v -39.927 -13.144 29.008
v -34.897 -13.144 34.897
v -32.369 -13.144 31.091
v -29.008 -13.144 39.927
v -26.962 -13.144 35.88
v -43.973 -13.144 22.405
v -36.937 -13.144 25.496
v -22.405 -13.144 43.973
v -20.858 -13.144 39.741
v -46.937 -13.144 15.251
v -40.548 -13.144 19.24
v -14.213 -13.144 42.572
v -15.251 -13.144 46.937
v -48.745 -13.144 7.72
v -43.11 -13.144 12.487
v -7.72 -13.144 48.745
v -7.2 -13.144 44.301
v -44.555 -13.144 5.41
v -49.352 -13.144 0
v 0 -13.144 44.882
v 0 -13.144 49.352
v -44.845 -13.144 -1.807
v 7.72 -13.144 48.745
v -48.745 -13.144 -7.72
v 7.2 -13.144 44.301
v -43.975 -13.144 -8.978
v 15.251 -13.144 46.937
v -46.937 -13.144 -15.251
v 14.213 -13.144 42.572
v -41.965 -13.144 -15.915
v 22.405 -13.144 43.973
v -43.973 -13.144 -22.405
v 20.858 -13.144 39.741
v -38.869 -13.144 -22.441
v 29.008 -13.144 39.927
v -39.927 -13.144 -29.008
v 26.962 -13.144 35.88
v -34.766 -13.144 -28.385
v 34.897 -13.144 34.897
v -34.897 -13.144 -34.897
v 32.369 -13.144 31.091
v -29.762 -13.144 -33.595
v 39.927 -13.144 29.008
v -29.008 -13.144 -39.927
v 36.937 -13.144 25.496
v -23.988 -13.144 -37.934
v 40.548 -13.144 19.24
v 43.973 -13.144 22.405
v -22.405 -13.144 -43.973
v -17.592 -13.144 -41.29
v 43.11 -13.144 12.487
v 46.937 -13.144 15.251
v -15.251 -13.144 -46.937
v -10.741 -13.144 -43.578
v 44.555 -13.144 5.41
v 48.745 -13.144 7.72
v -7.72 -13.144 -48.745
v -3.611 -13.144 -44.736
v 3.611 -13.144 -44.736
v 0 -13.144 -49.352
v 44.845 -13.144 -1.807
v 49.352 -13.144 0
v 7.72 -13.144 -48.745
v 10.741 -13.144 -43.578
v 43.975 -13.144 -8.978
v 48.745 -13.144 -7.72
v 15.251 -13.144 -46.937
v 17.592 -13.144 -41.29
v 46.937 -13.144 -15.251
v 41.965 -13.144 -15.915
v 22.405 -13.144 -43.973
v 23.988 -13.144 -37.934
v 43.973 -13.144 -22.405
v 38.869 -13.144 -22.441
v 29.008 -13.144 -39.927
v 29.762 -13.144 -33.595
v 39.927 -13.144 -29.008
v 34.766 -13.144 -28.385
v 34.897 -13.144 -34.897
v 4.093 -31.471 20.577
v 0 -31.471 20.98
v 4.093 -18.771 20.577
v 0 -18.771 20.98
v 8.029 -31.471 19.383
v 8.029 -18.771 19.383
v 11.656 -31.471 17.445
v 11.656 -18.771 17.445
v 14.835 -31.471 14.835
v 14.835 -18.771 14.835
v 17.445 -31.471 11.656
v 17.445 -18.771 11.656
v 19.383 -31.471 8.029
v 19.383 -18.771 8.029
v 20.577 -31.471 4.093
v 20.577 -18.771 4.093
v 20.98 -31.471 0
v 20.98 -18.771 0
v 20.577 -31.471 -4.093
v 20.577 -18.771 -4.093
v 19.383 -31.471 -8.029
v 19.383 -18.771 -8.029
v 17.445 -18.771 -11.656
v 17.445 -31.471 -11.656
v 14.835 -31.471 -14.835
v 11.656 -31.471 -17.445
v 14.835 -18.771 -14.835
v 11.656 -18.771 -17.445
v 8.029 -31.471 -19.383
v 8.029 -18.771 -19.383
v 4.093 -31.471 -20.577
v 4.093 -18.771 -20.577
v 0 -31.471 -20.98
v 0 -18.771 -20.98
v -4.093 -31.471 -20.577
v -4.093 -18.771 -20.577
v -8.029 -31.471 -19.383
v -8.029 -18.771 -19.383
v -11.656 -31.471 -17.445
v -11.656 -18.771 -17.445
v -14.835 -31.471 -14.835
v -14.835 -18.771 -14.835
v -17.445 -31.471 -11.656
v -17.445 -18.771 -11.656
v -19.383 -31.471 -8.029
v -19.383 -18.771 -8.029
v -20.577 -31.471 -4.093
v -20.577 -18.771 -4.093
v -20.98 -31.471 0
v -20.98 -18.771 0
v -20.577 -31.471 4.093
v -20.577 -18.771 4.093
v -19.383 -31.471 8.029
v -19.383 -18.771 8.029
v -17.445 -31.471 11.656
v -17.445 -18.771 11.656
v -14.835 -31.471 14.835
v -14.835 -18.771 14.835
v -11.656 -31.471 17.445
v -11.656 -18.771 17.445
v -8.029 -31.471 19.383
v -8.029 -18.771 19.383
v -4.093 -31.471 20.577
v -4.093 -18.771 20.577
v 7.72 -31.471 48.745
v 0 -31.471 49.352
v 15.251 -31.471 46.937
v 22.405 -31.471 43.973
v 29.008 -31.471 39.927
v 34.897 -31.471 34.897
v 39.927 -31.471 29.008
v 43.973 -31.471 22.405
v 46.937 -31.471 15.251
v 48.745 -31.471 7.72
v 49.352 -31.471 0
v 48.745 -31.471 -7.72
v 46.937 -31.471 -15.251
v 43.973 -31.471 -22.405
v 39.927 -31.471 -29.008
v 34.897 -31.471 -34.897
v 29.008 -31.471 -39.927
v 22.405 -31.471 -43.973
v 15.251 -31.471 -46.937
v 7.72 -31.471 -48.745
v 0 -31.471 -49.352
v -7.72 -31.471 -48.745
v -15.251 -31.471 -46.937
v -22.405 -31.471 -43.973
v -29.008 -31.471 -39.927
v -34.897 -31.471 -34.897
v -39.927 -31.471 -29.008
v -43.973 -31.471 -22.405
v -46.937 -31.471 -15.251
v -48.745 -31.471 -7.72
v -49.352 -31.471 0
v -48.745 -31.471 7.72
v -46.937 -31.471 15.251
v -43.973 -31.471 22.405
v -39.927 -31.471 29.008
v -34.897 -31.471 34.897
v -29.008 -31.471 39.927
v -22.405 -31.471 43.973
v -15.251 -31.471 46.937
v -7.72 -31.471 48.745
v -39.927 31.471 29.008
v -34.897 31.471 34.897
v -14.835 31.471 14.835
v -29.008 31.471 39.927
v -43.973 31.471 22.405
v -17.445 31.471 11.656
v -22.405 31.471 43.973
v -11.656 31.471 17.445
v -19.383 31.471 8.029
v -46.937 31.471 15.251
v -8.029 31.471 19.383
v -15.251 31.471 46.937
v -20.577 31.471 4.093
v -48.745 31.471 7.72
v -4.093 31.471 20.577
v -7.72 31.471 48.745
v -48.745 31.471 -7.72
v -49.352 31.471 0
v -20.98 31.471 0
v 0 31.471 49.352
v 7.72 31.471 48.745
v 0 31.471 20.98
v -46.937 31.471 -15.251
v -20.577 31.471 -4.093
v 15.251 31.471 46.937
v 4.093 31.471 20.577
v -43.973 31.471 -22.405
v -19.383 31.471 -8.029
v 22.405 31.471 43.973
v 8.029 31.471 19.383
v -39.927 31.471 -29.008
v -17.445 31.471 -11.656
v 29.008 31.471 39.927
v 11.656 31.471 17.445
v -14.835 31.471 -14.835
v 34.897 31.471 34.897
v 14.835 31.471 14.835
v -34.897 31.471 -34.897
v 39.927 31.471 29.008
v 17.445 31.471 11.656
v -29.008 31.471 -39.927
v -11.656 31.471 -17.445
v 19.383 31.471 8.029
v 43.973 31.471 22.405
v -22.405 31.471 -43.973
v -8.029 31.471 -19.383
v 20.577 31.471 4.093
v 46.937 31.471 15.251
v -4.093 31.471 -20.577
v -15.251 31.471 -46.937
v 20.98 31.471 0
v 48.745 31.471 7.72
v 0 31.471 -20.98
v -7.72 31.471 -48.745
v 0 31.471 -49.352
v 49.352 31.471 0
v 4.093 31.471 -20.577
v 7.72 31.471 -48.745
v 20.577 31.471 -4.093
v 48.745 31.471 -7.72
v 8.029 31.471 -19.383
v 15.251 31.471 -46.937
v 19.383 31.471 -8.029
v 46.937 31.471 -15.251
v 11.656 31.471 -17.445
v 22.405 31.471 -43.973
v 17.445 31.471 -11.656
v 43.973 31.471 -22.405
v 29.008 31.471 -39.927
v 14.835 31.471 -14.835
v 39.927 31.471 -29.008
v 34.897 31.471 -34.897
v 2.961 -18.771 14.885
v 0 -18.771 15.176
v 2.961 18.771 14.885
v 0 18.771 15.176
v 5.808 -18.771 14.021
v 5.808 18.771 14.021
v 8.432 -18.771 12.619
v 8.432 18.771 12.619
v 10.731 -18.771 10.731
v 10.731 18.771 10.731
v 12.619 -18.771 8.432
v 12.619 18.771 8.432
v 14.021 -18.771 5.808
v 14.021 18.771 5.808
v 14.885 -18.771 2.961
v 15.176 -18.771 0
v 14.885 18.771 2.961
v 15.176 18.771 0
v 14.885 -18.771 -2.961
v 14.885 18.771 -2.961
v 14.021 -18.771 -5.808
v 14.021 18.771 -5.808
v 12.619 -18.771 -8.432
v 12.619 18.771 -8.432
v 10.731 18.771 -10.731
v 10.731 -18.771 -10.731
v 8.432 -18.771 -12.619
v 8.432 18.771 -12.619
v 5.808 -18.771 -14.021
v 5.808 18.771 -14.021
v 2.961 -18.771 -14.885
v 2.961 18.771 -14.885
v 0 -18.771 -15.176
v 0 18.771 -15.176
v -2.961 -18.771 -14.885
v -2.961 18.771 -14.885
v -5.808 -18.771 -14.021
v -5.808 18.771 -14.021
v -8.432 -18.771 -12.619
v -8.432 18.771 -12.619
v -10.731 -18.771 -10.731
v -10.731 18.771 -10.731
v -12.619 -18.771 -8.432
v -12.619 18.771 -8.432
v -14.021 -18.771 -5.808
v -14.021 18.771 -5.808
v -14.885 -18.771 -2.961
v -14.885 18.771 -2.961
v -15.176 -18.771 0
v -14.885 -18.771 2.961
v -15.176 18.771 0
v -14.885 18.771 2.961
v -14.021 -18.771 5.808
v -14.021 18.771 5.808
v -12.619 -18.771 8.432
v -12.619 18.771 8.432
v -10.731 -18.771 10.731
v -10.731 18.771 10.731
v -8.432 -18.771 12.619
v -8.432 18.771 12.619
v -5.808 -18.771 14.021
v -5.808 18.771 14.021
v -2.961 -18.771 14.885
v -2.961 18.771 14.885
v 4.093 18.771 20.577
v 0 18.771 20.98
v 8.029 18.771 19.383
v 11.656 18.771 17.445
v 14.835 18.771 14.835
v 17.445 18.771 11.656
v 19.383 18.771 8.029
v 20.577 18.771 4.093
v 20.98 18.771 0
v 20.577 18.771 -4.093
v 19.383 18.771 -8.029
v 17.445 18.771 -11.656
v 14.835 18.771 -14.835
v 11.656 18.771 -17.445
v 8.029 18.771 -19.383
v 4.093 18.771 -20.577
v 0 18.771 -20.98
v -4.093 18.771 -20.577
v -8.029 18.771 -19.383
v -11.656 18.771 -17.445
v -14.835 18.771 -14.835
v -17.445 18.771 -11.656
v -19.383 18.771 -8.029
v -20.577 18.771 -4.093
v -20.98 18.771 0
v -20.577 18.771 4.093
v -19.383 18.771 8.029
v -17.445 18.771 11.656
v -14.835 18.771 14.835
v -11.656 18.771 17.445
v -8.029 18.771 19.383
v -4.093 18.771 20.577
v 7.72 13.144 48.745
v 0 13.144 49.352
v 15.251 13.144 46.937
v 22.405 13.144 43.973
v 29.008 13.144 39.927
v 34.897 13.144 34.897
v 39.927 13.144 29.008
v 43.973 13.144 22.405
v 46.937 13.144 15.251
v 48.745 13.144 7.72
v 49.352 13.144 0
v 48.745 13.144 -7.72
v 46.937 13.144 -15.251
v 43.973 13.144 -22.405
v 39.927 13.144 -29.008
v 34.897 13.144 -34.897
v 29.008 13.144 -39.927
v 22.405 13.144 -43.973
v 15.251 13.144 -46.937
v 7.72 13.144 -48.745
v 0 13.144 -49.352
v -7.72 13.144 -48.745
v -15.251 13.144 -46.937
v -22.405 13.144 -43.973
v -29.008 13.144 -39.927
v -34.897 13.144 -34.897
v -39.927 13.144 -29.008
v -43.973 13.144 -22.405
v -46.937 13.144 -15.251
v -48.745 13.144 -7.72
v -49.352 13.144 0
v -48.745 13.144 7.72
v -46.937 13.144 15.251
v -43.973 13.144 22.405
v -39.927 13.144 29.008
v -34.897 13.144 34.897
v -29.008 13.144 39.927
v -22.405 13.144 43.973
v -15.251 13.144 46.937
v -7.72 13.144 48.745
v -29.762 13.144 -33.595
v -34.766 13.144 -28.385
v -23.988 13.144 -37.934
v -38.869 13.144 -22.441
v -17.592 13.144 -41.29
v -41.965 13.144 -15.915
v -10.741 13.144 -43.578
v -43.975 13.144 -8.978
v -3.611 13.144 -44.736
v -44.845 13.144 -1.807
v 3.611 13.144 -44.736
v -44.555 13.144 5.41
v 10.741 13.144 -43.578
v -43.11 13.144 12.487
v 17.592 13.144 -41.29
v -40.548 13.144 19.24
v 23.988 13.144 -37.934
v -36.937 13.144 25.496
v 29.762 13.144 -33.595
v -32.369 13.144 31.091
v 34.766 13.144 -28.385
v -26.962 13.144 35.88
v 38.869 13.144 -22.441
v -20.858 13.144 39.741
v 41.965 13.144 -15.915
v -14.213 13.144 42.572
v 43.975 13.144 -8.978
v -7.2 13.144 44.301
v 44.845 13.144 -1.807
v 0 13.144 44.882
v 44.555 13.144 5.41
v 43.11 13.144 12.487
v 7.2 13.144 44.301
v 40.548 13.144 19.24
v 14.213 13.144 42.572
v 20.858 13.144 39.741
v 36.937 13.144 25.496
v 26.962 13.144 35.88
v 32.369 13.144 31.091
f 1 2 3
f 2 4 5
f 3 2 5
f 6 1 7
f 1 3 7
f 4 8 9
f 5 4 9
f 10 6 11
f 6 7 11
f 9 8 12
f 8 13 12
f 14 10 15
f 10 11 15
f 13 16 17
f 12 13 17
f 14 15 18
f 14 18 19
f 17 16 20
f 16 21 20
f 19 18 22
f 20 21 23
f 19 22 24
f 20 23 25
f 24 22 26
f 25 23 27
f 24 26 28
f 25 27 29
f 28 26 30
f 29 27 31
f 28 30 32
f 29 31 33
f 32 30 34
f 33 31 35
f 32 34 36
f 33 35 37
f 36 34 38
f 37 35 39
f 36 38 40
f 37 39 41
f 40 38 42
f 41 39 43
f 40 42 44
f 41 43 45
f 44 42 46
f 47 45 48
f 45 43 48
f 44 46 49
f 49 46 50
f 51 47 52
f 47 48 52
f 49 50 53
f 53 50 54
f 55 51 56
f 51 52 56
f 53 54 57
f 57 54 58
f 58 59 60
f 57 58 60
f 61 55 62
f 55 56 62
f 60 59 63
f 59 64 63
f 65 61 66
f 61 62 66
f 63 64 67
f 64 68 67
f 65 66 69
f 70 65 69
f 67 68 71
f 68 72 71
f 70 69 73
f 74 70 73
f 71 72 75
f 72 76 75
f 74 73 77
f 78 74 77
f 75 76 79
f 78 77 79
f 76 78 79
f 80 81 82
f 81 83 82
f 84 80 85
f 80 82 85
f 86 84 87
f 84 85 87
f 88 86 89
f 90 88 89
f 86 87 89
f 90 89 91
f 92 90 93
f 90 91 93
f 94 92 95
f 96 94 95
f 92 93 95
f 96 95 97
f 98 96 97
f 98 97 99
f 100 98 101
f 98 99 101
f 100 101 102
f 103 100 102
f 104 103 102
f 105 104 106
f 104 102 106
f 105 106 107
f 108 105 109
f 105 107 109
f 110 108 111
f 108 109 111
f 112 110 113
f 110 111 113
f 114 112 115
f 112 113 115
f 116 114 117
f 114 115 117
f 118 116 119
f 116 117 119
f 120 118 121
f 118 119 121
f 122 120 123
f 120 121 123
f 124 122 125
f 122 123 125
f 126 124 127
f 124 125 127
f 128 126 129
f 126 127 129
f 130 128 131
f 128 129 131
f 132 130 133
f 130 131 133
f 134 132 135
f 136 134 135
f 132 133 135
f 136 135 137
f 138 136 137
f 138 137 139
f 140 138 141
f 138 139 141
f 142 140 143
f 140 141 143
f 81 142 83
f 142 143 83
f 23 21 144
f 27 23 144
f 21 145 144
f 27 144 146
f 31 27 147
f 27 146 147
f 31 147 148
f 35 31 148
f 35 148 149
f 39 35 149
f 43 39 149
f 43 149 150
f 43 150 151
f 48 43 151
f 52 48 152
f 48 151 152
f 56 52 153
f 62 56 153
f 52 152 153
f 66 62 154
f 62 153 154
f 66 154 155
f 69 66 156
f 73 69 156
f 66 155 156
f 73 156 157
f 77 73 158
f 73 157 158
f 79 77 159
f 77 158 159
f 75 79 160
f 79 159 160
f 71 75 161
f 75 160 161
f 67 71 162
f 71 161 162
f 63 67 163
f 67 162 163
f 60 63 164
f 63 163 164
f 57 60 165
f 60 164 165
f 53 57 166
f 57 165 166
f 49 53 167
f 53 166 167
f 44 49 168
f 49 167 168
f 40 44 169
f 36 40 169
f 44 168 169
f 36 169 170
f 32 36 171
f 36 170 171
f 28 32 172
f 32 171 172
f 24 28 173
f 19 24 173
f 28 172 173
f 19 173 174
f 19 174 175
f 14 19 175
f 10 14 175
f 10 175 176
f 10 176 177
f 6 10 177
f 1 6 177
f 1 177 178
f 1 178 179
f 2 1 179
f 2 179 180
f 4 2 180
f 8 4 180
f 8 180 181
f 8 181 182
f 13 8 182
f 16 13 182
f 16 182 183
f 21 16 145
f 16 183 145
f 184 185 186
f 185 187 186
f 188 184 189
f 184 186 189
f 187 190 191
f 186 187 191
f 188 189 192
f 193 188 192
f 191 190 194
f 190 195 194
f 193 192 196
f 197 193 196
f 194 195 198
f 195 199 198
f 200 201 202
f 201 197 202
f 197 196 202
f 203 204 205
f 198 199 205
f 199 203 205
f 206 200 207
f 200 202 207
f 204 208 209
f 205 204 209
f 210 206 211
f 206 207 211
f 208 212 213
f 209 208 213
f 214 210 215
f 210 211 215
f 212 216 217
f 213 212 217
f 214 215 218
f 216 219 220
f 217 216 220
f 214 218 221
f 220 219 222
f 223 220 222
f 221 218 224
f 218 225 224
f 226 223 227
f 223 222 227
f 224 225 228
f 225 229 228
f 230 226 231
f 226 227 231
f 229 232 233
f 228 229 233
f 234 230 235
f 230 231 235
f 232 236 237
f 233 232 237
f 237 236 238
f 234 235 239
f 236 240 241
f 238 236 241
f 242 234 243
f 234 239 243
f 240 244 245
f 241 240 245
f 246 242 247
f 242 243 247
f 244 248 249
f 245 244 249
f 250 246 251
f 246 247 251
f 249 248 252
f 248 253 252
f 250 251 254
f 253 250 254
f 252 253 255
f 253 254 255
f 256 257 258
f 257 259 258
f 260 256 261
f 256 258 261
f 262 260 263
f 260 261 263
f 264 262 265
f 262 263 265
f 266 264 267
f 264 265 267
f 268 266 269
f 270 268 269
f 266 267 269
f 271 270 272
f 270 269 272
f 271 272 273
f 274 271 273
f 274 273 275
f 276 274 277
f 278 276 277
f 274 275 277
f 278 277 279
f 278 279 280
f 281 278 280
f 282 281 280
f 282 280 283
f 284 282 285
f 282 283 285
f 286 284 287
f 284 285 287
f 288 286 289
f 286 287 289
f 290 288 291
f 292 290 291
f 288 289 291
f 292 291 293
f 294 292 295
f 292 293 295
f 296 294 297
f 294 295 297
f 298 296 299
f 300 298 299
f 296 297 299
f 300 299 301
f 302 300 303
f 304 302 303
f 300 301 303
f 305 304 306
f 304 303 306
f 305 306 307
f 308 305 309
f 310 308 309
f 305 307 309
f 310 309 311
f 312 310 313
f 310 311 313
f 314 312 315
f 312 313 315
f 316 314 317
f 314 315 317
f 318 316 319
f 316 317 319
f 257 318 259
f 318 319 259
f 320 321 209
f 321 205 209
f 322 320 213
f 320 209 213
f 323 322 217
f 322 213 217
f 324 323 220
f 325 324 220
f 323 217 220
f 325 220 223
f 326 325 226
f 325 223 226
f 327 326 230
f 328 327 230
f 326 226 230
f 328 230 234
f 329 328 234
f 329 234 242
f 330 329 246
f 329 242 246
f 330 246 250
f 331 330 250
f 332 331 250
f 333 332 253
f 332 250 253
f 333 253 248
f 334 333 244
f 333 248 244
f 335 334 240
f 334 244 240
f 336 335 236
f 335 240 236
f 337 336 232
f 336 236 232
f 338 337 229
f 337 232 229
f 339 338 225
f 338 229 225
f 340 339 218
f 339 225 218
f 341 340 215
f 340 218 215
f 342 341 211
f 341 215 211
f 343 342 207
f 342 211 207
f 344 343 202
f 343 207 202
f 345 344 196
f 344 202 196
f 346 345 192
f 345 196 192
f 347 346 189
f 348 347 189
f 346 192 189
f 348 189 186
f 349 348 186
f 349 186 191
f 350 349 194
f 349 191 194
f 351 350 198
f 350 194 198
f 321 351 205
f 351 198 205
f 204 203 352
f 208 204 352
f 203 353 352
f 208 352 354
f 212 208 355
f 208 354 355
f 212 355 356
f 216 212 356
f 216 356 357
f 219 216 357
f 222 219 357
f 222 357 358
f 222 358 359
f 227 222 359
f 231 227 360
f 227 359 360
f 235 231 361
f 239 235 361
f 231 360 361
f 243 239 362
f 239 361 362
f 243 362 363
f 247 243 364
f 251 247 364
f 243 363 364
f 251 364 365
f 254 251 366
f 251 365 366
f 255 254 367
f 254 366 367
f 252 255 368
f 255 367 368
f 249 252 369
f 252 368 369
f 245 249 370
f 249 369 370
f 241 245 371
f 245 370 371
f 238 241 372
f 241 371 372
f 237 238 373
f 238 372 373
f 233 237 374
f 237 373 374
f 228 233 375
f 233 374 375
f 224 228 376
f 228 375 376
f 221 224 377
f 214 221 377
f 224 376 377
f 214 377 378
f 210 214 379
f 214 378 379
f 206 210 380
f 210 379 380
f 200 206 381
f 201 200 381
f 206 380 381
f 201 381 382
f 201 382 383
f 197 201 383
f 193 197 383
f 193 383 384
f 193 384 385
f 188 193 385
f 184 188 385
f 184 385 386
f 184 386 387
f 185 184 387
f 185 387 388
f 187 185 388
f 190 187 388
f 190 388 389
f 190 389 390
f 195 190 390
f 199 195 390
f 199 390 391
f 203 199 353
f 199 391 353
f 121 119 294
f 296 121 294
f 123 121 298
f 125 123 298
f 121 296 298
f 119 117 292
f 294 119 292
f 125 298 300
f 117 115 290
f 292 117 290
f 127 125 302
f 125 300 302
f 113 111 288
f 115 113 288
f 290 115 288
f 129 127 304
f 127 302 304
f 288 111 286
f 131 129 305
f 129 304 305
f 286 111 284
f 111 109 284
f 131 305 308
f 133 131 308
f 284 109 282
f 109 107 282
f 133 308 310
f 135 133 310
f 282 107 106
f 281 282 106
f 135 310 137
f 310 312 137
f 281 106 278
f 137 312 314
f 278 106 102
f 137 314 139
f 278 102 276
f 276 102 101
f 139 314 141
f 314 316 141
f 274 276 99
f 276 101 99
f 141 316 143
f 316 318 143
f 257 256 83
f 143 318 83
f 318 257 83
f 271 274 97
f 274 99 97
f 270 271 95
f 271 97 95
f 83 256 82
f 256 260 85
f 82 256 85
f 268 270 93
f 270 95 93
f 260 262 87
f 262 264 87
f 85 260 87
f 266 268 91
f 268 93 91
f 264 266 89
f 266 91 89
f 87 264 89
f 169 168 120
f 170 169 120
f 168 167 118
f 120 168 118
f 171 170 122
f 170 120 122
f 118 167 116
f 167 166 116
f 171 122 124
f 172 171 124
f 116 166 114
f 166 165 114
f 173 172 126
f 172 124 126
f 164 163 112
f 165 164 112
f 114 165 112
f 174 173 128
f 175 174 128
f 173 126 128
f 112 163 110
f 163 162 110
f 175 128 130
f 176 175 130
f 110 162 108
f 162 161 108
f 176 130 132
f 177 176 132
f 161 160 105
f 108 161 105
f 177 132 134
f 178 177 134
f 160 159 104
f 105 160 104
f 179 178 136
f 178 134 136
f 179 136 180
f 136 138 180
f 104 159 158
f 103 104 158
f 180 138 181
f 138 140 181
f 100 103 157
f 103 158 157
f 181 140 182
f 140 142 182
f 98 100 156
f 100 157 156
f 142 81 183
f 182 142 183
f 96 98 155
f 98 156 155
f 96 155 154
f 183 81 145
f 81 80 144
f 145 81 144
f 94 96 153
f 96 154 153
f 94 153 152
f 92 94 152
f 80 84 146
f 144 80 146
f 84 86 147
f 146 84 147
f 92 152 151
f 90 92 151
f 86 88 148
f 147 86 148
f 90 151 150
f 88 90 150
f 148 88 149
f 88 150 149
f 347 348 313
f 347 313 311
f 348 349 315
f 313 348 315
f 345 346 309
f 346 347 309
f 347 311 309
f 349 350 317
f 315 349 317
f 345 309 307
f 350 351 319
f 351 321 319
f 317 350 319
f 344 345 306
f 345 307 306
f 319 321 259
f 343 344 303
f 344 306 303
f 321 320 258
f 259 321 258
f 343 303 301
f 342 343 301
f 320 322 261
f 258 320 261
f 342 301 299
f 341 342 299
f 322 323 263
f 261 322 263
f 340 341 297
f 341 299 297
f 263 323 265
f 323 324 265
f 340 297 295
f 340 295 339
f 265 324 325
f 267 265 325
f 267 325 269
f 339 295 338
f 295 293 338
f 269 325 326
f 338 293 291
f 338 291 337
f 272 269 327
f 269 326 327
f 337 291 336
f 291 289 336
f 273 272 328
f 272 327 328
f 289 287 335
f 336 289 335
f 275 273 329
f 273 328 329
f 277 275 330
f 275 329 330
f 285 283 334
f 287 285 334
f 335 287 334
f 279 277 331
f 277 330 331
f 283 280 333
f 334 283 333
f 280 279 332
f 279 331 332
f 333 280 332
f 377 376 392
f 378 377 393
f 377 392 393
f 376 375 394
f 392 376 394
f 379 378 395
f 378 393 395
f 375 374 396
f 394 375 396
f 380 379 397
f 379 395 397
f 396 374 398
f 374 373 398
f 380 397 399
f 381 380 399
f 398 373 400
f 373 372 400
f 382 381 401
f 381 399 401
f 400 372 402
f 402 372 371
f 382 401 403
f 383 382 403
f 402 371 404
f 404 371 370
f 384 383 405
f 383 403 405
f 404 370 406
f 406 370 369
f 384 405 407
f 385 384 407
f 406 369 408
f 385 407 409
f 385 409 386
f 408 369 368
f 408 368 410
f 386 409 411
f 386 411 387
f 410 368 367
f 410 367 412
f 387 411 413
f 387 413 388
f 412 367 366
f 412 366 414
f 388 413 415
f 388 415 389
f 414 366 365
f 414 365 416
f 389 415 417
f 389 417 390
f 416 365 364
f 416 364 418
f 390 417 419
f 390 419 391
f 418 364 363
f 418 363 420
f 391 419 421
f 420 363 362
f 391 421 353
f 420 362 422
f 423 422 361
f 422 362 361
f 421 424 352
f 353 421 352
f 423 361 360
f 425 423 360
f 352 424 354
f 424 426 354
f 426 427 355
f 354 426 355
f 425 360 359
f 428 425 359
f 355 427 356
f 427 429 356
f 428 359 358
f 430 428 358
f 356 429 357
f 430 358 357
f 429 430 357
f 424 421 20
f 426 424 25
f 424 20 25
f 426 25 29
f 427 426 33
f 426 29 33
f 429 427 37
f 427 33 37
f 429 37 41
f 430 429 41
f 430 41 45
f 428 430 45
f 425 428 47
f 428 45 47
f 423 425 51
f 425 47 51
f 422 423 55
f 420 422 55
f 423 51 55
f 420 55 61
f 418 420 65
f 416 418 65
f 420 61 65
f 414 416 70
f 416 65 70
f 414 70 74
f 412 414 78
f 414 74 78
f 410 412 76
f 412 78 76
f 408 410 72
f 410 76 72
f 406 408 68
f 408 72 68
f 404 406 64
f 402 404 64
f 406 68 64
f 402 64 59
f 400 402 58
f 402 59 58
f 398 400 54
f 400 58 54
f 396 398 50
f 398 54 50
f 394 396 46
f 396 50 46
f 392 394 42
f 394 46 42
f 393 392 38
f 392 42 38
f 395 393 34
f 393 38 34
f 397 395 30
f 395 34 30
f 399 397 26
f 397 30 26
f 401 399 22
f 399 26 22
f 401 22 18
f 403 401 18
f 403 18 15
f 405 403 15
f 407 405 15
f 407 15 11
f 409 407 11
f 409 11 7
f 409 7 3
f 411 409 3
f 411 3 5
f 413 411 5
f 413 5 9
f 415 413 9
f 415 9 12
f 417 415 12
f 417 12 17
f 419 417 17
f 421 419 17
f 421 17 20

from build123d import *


with BuildPart() as f1:
    # F0 (on Right) → F1 (revolve)
    with BuildSketch(Plane.YZ):
        Polygon((-18.7706, 15.1765), (0, 15.1765), (18.7706, 15.1765), (18.7706, 20.9804), (31.4706, 20.9804), (31.4706, 49.3522), (13.1445, 49.3522), (13.1445, 44.8818), (-13.1445, 44.8818), (-13.1445, 49.3522), (-31.4706, 49.3522), (-31.4706, 20.9804), (-18.7706, 20.9804), align=None)
    revolve(axis=Axis((0, -0.984378, 0), (0, 1, 0)))


solid = f1.part
